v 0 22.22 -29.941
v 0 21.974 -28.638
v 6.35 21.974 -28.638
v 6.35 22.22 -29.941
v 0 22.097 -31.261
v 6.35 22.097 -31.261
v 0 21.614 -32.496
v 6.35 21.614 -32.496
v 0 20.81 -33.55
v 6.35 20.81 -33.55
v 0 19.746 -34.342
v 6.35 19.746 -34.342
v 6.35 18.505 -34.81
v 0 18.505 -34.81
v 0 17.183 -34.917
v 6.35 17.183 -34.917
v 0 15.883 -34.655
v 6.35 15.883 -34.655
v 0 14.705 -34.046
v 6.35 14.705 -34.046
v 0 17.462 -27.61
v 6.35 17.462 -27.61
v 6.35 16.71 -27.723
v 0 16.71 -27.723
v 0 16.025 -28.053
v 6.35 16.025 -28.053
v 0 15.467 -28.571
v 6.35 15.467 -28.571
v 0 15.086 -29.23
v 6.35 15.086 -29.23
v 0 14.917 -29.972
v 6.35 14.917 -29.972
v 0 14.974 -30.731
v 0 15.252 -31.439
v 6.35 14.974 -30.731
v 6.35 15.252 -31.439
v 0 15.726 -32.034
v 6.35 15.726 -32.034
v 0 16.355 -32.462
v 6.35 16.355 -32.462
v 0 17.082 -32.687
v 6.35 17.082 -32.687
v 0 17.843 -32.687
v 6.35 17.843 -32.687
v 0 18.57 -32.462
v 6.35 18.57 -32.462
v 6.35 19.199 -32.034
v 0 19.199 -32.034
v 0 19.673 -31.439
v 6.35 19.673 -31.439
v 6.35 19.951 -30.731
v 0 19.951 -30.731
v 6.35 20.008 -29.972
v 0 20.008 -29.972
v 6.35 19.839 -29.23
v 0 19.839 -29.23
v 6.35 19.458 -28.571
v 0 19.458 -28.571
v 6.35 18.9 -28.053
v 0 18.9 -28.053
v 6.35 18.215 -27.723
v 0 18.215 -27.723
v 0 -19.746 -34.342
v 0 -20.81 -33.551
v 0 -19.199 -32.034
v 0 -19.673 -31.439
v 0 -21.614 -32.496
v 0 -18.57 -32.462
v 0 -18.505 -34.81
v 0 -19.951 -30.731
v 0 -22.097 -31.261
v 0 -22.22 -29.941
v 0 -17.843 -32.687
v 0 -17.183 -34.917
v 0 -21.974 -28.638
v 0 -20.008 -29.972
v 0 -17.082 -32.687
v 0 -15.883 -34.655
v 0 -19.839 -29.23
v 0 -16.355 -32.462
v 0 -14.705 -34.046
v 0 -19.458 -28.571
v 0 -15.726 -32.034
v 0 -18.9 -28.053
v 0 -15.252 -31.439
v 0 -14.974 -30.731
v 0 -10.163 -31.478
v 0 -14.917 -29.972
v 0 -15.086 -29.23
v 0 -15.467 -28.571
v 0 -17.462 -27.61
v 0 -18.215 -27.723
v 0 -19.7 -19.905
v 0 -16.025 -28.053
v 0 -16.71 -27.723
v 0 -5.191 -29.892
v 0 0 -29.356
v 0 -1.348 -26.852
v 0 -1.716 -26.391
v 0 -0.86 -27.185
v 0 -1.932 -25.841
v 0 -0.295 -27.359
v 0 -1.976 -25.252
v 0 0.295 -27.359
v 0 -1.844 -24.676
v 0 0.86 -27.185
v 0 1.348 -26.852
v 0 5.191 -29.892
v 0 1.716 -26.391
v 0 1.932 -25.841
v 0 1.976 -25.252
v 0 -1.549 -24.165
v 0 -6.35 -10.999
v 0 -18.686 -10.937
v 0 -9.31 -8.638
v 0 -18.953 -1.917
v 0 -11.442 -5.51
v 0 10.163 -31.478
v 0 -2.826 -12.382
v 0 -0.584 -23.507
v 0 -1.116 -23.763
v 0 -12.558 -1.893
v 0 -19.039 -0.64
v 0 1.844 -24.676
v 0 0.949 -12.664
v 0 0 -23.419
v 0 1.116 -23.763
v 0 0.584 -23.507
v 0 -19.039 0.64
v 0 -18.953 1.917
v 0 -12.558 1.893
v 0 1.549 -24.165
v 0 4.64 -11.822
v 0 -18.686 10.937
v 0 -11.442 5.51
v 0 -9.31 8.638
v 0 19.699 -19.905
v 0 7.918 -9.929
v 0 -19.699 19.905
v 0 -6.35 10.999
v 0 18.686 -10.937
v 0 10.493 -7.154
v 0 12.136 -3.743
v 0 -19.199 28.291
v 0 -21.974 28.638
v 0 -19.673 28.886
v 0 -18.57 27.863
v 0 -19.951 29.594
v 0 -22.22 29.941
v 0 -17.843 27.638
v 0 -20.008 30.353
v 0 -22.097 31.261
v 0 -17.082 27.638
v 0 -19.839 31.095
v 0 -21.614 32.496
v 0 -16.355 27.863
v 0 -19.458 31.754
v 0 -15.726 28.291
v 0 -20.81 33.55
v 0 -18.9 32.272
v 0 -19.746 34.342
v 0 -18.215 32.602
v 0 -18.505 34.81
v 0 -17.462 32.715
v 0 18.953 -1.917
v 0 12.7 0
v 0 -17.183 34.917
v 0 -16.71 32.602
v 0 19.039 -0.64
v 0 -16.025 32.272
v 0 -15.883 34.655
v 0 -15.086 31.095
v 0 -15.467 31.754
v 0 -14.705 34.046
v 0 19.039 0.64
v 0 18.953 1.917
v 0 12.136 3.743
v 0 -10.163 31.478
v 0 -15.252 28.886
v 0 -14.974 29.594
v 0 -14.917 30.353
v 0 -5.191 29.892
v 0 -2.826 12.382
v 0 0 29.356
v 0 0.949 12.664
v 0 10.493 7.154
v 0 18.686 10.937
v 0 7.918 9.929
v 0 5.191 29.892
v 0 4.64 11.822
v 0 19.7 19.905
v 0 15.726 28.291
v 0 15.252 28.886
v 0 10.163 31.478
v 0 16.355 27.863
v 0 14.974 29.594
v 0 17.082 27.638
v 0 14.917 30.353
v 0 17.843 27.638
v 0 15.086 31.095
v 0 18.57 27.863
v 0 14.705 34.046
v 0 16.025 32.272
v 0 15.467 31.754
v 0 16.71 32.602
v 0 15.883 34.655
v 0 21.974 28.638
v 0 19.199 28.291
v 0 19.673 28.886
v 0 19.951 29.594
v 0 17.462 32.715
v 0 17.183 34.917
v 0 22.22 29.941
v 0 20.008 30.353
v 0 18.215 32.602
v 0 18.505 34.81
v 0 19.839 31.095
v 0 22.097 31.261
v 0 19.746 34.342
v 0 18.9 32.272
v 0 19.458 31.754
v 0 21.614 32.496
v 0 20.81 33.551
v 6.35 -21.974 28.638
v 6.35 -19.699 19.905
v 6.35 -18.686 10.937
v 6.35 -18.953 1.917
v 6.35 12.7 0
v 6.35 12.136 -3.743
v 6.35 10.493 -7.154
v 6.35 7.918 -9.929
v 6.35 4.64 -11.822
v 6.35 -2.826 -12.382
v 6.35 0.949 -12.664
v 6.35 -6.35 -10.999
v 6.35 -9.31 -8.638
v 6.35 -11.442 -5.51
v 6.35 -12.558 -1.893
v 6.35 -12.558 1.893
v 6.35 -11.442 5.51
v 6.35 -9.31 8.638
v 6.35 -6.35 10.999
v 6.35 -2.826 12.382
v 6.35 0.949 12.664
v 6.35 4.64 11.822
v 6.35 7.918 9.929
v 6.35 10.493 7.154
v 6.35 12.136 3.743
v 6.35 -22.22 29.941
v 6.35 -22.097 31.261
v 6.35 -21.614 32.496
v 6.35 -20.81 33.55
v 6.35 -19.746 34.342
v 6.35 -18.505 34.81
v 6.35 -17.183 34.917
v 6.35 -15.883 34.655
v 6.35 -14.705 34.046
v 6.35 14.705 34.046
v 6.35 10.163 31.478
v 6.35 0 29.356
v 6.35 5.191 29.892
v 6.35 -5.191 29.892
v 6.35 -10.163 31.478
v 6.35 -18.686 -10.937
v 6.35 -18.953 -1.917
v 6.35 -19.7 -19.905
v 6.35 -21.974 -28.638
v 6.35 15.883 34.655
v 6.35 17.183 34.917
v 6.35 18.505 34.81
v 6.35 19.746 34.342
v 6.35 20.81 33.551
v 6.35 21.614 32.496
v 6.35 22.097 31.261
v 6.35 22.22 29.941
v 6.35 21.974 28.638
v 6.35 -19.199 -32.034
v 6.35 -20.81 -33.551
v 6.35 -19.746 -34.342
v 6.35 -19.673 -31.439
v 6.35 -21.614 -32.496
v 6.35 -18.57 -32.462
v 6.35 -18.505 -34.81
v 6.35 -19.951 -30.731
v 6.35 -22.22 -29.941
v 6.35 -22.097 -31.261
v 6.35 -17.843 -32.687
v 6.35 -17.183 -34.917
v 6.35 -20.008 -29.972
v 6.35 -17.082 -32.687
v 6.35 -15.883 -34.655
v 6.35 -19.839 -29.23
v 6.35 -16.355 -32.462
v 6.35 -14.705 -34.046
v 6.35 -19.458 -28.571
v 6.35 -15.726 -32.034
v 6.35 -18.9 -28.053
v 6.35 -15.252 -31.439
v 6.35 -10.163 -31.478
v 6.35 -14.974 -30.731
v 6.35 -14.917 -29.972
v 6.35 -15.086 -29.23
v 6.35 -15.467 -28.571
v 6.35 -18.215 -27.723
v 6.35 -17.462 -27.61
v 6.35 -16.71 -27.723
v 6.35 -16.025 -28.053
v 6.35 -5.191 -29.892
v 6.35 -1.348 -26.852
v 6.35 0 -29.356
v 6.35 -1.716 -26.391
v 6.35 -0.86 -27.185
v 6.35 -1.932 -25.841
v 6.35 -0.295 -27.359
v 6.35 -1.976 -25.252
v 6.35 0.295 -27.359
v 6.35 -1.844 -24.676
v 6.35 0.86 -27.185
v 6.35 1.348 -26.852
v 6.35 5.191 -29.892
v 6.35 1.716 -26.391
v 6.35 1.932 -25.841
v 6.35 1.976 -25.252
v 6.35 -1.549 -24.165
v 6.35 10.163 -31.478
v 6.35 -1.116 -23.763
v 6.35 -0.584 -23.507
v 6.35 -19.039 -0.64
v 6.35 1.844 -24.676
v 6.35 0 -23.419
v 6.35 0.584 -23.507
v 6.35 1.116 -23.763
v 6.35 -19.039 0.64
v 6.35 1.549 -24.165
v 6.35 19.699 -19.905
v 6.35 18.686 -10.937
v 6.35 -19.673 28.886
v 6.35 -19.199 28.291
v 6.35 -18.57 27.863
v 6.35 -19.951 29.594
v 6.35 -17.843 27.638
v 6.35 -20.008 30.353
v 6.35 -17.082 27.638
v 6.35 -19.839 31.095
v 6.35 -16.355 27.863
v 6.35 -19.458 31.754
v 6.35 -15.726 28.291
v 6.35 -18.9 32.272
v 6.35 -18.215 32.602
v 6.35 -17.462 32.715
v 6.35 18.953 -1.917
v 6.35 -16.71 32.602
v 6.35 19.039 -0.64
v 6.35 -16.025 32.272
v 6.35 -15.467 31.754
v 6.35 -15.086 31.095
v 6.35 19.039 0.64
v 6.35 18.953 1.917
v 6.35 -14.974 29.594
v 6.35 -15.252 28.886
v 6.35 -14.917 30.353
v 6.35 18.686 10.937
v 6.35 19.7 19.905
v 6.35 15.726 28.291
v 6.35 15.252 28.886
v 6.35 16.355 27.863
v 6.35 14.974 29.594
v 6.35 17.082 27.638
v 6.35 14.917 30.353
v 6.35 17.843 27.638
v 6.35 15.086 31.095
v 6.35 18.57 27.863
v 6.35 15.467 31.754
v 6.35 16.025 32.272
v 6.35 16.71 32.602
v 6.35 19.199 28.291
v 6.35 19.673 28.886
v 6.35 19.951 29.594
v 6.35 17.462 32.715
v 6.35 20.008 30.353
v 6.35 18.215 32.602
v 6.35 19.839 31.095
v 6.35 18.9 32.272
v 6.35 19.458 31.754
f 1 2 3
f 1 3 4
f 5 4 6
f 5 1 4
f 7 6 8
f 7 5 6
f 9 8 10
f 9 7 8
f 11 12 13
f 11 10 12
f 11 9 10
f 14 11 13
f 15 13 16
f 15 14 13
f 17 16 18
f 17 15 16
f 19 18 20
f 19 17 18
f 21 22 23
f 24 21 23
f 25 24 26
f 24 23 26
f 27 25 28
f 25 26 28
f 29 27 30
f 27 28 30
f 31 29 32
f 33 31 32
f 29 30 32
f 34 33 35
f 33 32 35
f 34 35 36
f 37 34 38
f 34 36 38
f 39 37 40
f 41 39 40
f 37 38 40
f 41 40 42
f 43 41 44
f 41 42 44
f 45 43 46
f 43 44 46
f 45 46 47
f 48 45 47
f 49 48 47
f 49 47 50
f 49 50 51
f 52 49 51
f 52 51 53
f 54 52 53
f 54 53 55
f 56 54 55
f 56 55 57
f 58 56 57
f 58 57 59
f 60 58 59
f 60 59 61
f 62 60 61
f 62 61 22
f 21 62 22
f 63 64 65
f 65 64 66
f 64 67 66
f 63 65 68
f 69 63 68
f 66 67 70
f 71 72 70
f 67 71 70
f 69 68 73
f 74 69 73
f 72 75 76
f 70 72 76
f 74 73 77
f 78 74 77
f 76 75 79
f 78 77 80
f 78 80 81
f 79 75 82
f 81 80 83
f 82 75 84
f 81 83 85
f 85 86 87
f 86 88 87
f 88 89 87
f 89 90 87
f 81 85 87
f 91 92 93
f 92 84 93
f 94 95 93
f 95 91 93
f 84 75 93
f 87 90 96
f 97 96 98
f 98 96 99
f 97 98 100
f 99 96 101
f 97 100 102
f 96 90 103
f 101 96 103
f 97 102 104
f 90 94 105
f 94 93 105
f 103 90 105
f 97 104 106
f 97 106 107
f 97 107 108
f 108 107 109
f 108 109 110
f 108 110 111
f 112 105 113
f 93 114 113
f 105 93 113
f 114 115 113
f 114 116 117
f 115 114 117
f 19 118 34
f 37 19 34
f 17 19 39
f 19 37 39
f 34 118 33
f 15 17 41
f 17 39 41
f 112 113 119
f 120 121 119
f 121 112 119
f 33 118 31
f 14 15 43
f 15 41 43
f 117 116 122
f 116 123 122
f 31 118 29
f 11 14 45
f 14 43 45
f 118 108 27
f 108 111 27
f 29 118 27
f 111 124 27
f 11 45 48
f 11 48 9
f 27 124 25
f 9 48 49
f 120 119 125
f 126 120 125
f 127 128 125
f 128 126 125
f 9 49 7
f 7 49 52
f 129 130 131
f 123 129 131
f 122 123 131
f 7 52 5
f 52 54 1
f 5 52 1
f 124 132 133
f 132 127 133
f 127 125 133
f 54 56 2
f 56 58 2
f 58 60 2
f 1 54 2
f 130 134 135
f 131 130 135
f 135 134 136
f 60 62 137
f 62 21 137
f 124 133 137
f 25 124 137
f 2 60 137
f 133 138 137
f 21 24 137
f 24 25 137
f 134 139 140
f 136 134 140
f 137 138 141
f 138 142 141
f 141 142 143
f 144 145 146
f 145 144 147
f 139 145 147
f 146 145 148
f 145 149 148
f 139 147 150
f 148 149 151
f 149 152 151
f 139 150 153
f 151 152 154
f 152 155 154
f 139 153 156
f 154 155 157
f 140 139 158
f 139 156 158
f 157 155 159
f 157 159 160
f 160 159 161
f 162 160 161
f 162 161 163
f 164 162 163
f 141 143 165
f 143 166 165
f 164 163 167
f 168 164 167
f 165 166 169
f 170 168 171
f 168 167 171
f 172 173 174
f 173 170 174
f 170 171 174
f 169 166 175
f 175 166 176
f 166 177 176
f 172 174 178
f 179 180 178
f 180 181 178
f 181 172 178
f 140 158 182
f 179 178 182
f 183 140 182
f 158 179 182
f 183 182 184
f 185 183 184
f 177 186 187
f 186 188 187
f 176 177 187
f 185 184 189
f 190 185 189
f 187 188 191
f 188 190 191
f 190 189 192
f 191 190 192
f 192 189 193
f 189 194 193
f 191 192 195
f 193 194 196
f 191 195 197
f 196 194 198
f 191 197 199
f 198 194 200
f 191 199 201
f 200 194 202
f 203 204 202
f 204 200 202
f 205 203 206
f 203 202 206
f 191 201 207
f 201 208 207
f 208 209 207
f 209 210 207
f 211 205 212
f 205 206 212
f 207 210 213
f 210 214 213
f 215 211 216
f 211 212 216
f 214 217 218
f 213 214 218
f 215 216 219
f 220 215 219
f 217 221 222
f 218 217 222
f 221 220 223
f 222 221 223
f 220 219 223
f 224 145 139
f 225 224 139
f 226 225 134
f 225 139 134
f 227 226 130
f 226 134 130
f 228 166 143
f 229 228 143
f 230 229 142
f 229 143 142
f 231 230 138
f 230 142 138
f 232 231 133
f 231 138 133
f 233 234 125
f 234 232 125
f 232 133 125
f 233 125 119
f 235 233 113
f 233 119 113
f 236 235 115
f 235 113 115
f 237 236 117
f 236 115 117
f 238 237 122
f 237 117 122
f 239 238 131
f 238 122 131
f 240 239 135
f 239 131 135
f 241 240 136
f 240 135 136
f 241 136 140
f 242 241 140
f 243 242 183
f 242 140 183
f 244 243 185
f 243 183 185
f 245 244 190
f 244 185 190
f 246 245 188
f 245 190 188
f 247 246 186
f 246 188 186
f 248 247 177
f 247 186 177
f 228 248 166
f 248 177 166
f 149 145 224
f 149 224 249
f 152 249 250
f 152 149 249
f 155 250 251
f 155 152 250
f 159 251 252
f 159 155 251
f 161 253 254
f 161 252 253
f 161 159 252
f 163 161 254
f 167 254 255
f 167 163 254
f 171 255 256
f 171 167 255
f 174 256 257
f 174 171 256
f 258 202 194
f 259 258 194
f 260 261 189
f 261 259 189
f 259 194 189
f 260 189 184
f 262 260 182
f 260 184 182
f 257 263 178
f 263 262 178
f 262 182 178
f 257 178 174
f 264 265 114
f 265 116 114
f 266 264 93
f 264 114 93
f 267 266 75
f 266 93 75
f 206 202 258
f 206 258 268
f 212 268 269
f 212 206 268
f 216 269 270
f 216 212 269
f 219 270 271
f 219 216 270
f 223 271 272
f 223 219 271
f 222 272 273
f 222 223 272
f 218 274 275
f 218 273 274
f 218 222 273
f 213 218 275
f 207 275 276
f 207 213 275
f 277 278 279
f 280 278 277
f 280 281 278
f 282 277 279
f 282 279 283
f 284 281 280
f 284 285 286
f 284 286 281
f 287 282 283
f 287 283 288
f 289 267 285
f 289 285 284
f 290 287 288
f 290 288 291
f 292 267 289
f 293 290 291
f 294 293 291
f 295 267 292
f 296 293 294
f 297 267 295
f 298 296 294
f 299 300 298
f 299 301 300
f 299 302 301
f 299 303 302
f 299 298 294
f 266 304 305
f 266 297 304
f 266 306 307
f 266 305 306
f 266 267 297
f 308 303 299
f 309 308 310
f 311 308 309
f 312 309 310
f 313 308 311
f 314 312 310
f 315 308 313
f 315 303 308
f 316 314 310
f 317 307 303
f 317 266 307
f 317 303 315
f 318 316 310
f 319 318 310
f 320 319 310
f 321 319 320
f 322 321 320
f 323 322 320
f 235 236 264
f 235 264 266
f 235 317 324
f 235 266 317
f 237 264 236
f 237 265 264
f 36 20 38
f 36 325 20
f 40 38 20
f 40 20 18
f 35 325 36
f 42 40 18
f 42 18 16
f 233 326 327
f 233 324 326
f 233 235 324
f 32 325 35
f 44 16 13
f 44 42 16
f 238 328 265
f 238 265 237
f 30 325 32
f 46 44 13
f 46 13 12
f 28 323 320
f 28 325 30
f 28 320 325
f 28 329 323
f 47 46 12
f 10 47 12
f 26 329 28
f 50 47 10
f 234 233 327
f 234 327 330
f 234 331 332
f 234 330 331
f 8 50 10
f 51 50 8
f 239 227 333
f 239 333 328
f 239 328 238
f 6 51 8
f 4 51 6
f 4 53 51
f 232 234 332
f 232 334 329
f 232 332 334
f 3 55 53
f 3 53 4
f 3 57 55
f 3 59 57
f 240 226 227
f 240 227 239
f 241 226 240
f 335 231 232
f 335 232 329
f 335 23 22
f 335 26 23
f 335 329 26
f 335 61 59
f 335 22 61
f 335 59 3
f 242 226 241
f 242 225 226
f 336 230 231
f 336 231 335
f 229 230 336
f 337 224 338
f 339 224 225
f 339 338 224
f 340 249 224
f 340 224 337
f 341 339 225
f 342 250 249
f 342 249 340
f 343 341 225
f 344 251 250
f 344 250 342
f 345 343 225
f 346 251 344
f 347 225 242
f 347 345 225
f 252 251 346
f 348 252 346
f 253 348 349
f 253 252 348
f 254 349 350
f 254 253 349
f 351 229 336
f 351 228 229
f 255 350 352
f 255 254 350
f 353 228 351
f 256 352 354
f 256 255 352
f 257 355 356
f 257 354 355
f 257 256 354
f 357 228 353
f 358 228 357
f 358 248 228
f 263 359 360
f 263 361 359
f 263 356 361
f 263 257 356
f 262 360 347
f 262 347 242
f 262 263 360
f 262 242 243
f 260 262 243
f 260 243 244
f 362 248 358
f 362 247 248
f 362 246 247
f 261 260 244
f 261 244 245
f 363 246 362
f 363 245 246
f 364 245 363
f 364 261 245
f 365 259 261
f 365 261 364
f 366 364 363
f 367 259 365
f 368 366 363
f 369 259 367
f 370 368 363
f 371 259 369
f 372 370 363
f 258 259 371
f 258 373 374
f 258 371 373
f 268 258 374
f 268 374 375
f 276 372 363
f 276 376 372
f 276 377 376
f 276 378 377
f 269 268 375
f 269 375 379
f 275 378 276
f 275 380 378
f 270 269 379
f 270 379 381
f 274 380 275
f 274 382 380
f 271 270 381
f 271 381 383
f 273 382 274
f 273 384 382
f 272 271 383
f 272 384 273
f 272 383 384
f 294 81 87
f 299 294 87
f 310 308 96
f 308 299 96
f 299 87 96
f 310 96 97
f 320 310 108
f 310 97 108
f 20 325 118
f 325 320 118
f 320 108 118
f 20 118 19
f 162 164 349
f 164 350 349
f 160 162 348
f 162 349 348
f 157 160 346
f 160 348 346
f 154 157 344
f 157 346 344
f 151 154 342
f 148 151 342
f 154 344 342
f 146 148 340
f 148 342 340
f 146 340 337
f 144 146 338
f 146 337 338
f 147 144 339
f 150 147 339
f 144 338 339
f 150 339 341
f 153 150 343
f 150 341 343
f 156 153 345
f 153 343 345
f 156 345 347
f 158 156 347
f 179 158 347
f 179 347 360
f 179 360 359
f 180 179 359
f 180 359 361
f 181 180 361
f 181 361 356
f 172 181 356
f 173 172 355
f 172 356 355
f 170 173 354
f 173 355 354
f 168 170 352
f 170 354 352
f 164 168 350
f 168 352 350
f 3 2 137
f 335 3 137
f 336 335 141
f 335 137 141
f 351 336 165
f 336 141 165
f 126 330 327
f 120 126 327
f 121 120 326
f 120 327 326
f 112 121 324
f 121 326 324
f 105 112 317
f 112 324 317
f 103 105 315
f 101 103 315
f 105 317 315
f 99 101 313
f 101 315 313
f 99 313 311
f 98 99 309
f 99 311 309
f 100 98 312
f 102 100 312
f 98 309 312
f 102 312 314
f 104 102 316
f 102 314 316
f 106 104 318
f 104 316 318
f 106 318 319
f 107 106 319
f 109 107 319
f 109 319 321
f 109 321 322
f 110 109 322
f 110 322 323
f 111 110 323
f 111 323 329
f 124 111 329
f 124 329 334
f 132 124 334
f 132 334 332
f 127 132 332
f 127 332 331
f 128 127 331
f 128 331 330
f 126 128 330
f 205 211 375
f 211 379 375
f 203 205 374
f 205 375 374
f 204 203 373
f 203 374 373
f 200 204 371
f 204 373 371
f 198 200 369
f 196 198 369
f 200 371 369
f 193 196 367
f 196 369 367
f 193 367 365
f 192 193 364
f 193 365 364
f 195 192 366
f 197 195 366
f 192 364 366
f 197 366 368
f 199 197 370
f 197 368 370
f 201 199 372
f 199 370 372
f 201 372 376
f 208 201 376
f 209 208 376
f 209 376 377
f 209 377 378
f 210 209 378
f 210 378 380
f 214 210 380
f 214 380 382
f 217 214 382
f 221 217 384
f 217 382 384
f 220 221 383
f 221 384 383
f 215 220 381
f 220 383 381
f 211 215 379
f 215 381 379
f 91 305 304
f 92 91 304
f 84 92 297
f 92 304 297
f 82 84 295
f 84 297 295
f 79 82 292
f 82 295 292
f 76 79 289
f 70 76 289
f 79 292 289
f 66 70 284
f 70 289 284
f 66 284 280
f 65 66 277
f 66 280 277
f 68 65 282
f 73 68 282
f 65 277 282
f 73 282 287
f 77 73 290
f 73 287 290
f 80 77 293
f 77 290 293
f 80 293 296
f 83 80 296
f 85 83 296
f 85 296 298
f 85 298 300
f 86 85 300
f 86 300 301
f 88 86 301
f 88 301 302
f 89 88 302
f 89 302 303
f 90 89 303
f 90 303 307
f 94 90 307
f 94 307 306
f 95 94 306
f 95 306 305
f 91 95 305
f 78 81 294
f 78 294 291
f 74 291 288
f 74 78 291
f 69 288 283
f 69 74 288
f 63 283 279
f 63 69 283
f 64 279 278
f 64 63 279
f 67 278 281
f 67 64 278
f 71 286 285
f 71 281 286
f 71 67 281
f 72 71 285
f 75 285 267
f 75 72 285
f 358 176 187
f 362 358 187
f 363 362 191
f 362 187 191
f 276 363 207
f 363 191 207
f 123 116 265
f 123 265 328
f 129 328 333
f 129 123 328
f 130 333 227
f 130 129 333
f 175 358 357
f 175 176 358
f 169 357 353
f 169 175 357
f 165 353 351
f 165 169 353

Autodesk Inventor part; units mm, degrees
ref_plane "YZ Plane" through (0, 0, 0) normal (1, 0, 0) x (0, 1, 0)
ref_plane "XZ Plane" through (0, 0, 0) normal (0, 1, 0) x (-1, 0, 0)
ref_plane "XY Plane" through (0, 0, 0) normal (0, 0, 1) x (1, 0, 0)
sketch "Sketch1" plane through (0, 0, 0) normal (1, 0, 0) x (0, 1, 0)
  line L0 (-17.4625, -30.1625) -> (17.4625, -30.1625) construction
  line L1 (17.4625, -30.1625) -> (17.4625, 30.1625) construction
  line L2 (17.4625, 30.1625) -> (-17.4625, 30.1625) construction
  line L3 (-17.4625, 30.1625) -> (-17.4625, -30.1625) construction
  line L4 (-17.4625, -30.1625) -> (17.4625, 30.1625) construction
  line L5 (17.4625, -30.1625) -> (-17.4625, 30.1625) construction
  circle A0 centre (17.4625, 30.1625) radius 4.7625 construction
  circle A1 centre (-17.4625, 30.1625) radius 4.7625 construction
  circle A2 centre (-17.4625, -30.1625) radius 4.7625 construction
  circle A3 centre (17.4625, -30.1625) radius 4.7625 construction
  circle A4 centre (0, 0) radius 12.7
  circle A5 centre (0, 0) radius 19.05 construction
  arc A6 (21.9743, 28.6376) -> (18.9533, 1.9166) centre (82.1311, 8.3053) ccw
  arc A7 (18.9533, -1.9166) -> (21.9743, -28.6376) centre (82.1311, -8.3053) ccw
  arc A8 (14.7053, -34.0457) -> (-14.7053, -34.0457) centre (0, -54.7559) ccw
  arc A9 (-21.9743, -28.6376) -> (-18.9533, -1.9166) centre (-82.1311, -8.3053) ccw
  arc A10 (-18.9533, 1.9166) -> (-21.9743, 28.6376) centre (-82.1311, 8.3053) ccw
  arc A11 (-14.7053, 34.0457) -> (14.7053, 34.0457) centre (0, 54.7559) ccw
  arc A12 (21.9743, 28.6376) -> (14.7053, 34.0457) centre (17.4625, 30.1625) ccw
  arc A13 (14.7053, -34.0457) -> (21.9743, -28.6376) centre (17.4625, -30.1625) ccw
  arc A14 (-21.9743, -28.6376) -> (-14.7053, -34.0457) centre (-17.4625, -30.1625) ccw
  arc A15 (-14.7053, 34.0457) -> (-21.9743, 28.6376) centre (-17.4625, 30.1625) ccw
  arc A16 (-18.9533, 1.9166) -> (-18.9533, -1.9166) centre (0, 0) ccw
  arc A17 (18.9533, -1.9166) -> (18.9533, 1.9166) centre (0, 0) ccw
  point P0 (0, 0)
  point P1 (0, 0)
  point P2 (0, -25.4)
  point P3 (14.7053, -34.0457)
  dimension "d1" = 34.925
  dimension "d2" = 60.325
  dimension "d3" = 25.4
  dimension "d4" = 9.525
  dimension "d5" = 25.4
  dimension "d6" = 6.35
  dimension "d7" = 63.5
  dimension "d8" = 25.4
extrude "Extrusion1" add sketch "Sketch1" along normal blind 6.35
hole "Hole1" at (0, 17.4625, 30.1625) at (0, 17.4625, -30.1625) at (0, -17.4625, -30.1625) at (0, -17.4625, 30.1625) direction (1, 0, 0) diameter 5.1054 end through all
hole "Hole2" at (0, 0, -25.4) direction (1, 0, 0) diameter 3.9624 end through all
properties part number "AR-021" material "Aluminum 6061"
